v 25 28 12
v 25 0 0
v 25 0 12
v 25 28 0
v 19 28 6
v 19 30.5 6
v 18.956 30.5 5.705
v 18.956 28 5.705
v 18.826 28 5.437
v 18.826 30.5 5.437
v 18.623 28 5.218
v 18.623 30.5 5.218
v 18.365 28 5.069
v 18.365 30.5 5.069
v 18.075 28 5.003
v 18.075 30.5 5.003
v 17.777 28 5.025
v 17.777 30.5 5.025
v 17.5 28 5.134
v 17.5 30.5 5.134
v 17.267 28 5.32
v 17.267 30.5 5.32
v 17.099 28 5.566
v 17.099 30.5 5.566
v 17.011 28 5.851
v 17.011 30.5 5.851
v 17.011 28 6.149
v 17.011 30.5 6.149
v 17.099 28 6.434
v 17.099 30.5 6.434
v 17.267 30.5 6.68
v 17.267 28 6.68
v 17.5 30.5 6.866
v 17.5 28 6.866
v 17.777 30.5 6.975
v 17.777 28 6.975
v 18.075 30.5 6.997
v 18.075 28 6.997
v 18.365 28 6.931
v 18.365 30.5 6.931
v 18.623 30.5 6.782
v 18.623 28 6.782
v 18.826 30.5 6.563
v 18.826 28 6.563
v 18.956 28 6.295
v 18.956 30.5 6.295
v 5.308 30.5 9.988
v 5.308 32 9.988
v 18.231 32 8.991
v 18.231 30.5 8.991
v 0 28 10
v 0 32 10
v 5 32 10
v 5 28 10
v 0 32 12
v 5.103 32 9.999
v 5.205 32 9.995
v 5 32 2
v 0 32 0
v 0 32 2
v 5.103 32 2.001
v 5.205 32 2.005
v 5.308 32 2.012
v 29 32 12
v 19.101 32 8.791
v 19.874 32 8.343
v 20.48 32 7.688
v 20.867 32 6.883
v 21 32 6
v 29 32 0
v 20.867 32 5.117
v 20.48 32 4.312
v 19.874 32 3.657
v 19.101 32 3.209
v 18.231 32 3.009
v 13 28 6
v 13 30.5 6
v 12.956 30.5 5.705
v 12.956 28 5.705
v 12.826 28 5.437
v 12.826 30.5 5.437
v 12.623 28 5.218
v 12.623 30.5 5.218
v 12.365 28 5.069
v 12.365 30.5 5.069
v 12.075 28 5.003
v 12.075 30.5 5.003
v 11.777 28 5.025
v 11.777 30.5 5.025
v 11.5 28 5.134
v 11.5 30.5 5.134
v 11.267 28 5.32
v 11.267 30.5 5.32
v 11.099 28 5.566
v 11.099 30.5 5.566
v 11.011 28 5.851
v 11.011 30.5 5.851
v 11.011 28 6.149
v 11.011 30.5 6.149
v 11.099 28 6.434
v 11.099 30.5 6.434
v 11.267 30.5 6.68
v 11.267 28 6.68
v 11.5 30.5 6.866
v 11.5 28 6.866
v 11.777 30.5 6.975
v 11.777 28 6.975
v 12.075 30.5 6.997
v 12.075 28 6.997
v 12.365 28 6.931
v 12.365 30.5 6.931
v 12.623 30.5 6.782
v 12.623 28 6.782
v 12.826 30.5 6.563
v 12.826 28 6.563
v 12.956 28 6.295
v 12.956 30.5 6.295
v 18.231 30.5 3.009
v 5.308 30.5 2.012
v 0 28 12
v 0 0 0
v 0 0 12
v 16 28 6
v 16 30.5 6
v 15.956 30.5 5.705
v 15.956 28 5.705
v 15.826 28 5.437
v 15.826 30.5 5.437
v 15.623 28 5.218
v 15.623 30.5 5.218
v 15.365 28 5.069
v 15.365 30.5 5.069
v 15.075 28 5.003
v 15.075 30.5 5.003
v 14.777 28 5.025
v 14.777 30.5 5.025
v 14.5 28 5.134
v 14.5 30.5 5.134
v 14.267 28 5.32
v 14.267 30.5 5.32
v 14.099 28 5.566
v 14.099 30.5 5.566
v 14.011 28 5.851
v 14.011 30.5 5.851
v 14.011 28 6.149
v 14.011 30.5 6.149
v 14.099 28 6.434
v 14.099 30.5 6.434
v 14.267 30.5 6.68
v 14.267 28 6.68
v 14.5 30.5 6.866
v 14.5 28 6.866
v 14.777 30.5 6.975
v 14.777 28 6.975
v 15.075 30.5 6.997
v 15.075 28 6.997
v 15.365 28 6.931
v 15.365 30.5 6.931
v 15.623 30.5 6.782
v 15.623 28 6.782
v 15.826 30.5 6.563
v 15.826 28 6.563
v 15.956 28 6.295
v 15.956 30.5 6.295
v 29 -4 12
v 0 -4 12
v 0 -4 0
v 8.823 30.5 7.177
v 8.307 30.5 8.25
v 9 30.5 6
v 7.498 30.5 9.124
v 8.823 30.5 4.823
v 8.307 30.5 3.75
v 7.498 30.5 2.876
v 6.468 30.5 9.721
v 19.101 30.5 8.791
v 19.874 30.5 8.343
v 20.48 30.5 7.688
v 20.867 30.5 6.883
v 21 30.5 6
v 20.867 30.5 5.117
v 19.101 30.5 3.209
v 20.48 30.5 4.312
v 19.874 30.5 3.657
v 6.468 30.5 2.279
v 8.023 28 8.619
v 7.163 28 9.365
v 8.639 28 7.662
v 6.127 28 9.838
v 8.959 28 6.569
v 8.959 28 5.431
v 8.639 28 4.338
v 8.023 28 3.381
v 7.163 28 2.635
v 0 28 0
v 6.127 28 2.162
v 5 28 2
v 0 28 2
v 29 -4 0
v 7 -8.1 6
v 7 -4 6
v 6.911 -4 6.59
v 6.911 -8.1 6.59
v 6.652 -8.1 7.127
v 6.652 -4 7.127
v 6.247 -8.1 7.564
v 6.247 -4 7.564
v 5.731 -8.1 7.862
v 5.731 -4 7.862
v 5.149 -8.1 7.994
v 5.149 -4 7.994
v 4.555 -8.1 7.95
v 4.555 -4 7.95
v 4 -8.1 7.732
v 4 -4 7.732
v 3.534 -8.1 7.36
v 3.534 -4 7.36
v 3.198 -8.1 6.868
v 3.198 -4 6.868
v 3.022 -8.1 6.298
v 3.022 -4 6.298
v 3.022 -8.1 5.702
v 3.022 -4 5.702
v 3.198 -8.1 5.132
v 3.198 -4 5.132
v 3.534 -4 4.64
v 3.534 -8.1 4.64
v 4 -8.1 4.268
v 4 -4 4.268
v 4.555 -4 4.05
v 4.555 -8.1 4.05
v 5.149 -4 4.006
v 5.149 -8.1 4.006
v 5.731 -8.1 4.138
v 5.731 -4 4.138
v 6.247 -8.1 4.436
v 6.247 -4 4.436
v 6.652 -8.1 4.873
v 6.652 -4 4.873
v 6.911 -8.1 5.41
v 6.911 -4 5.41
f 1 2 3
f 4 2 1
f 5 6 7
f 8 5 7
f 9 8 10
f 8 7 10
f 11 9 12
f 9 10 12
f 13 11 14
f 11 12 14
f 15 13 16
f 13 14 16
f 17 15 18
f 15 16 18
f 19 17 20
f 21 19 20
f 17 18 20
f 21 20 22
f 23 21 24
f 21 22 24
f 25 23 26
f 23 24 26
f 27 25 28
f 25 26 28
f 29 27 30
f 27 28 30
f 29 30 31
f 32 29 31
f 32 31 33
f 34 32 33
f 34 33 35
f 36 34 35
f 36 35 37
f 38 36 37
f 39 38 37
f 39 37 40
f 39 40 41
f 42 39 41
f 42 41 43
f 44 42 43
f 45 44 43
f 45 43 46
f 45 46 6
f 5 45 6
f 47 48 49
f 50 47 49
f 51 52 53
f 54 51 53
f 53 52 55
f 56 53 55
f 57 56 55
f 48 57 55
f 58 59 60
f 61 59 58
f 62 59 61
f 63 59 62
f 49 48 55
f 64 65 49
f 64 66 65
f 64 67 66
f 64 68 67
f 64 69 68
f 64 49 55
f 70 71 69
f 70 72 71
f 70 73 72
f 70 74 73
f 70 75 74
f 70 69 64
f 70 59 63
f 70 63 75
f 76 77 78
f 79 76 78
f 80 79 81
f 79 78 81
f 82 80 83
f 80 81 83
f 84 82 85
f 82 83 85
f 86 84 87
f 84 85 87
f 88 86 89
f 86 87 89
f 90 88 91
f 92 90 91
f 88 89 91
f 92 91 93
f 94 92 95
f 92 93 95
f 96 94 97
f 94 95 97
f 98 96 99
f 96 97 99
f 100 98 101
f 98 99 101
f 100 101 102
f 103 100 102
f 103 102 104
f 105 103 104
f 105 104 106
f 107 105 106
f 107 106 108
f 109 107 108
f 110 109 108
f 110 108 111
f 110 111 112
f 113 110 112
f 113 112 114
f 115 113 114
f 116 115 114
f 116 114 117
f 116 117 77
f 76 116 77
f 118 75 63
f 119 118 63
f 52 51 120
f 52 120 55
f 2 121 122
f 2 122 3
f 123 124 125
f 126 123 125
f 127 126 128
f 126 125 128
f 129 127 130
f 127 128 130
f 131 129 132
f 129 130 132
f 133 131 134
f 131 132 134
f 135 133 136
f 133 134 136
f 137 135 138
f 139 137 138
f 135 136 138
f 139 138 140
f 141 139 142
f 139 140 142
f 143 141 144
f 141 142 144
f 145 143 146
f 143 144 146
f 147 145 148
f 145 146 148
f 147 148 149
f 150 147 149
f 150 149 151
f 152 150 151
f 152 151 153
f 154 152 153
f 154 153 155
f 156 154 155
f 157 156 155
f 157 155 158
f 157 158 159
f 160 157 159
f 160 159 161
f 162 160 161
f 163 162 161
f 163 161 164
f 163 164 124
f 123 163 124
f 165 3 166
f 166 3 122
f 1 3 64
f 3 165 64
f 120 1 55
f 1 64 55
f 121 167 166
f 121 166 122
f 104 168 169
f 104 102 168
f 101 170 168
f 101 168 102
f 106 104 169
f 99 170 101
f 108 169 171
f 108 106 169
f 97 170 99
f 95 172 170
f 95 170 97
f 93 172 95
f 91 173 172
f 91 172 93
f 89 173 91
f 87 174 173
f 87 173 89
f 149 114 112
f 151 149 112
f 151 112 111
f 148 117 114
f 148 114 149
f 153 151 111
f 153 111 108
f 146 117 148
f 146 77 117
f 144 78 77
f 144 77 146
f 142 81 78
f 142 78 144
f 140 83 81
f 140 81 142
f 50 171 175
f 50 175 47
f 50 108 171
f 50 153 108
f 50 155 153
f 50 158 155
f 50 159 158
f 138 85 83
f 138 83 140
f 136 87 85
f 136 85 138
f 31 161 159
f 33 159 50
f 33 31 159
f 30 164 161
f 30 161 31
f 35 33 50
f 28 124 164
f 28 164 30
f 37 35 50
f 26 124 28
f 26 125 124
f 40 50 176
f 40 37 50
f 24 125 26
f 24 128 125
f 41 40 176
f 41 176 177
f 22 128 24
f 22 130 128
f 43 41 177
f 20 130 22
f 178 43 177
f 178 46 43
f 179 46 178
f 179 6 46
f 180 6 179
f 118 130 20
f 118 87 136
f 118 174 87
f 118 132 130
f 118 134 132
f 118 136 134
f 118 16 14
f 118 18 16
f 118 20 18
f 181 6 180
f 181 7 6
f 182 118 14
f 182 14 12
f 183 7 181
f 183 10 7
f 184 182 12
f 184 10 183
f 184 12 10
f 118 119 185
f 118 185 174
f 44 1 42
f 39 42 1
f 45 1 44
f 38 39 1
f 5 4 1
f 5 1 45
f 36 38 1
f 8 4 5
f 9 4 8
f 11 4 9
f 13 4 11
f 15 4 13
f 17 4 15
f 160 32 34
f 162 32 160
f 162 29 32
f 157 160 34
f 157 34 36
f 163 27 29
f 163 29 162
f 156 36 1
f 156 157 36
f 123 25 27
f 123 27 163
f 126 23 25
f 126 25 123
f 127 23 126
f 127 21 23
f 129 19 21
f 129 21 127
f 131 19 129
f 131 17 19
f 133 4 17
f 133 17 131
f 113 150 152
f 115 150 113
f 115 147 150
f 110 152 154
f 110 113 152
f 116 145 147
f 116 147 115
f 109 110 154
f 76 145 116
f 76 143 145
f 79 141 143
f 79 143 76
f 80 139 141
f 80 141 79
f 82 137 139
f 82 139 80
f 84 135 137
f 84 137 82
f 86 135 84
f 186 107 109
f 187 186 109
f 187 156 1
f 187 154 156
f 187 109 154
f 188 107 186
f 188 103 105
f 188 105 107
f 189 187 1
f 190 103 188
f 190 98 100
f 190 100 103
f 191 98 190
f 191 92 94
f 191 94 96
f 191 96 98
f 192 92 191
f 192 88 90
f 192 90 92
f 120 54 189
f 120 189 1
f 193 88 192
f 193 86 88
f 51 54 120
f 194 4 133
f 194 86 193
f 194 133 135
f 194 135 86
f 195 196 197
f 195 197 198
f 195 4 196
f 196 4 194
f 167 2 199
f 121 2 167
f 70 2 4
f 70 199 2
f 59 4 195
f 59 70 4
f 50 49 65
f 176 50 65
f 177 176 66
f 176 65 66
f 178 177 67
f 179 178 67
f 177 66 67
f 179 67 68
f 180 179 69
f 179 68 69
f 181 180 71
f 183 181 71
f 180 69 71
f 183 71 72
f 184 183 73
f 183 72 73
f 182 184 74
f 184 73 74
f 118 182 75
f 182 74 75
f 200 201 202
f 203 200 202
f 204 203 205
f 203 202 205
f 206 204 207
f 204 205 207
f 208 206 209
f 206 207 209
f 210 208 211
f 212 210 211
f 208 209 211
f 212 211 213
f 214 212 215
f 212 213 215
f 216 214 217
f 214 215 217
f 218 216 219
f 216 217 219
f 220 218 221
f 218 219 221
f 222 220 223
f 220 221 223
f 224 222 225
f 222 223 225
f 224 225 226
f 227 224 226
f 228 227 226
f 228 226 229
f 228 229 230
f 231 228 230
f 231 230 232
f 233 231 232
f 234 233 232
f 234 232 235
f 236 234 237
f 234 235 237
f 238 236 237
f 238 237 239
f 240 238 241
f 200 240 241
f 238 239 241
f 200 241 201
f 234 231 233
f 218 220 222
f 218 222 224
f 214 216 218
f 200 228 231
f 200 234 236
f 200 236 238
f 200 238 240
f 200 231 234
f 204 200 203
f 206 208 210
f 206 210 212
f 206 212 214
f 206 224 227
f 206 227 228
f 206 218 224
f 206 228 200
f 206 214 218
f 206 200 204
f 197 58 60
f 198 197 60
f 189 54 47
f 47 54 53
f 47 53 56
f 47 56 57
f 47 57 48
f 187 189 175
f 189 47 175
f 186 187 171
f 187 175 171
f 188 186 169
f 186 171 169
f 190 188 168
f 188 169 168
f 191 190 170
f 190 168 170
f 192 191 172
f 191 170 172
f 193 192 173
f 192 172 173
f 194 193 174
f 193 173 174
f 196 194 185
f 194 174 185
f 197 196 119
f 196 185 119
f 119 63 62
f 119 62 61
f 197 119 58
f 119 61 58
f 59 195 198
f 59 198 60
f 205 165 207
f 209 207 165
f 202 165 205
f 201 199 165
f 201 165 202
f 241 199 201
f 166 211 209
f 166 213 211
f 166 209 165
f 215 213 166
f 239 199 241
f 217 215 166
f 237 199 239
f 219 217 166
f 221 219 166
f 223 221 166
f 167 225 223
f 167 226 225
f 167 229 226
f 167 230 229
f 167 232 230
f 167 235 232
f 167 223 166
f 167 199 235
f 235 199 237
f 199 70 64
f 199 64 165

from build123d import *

# Parameters (mm, degrees)
EXTRUDE_1_DEPTH     = 12
CUT_EXTRUDE_1_DEPTH = 5.1
CUT_EXTRUDE_2_DEPTH = 1.5
SKETCH_4_3_R        = 1
CUT_EXTRUDE_3_DEPTH = 6.5
SKETCH_2_R          = 2
EXTRUDE_2_DEPTH     = 4.1


with BuildPart() as part:
    # 草图1 → 凸台-拉伸1 (new body)
    with BuildSketch(Plane.XY):
        Polygon((0, 0), (25, 0), (25, 28), (0, 28), (0, 32), (29, 32), (29, -4), (0, -4), align=None)
    extrude(amount=EXTRUDE_1_DEPTH)

    # 草图3 → 切除-拉伸1 (cut)
    with BuildSketch(Plane(origin=(0, 32, 0), x_dir=(1, 0, 0), z_dir=(0, 1, 0))):
        with BuildLine():
            Line((5, -2), (0, -2))
            Line((0, -2), (0, -10))
            Line((0, -10), (5, -10))
            ThreePointArc((5, -10), (9, -6), (5, -2))
        make_face()
    extrude(amount=-CUT_EXTRUDE_1_DEPTH, mode=Mode.SUBTRACT)

    # 草图4 → 切除-拉伸2 (cut)
    with BuildSketch(Plane(origin=(0, 32, 0), x_dir=(1, 0, 0), z_dir=(0, 1, 0))):
        with BuildLine():
            Line((18.230769231, -3.008888908), (5.307692308, -2.011851878))
            ThreePointArc((5.307692308, -2.011851878), (9, -6), (5.307692308, -9.988148122))
            Line((5.307692308, -9.988148122), (18.230769231, -8.991111092))
            ThreePointArc((18.230769231, -8.991111092), (21, -6), (18.230769231, -3.008888908))
        make_face()
    extrude(amount=-CUT_EXTRUDE_2_DEPTH, mode=Mode.SUBTRACT)

    # 草图4<3> → 切除-拉伸3 (cut)
    with BuildSketch(Plane(origin=(0, 32, 0), x_dir=(1, 0, 0), z_dir=(0, 1, 0))):
        with Locations((12, -6)):
            Circle(SKETCH_4_3_R)
        with Locations((15, -6)):
            Circle(SKETCH_4_3_R)
        with Locations((18, -6)):
            Circle(SKETCH_4_3_R)
    extrude(amount=-CUT_EXTRUDE_3_DEPTH, mode=Mode.SUBTRACT)

    # 草图2 → 凸台-拉伸2 (add)
    with BuildSketch(Plane.XZ.offset(4)):
        with Locations((5, 6)):
            Circle(SKETCH_2_R)
    extrude(amount=EXTRUDE_2_DEPTH)


solid = part.part
